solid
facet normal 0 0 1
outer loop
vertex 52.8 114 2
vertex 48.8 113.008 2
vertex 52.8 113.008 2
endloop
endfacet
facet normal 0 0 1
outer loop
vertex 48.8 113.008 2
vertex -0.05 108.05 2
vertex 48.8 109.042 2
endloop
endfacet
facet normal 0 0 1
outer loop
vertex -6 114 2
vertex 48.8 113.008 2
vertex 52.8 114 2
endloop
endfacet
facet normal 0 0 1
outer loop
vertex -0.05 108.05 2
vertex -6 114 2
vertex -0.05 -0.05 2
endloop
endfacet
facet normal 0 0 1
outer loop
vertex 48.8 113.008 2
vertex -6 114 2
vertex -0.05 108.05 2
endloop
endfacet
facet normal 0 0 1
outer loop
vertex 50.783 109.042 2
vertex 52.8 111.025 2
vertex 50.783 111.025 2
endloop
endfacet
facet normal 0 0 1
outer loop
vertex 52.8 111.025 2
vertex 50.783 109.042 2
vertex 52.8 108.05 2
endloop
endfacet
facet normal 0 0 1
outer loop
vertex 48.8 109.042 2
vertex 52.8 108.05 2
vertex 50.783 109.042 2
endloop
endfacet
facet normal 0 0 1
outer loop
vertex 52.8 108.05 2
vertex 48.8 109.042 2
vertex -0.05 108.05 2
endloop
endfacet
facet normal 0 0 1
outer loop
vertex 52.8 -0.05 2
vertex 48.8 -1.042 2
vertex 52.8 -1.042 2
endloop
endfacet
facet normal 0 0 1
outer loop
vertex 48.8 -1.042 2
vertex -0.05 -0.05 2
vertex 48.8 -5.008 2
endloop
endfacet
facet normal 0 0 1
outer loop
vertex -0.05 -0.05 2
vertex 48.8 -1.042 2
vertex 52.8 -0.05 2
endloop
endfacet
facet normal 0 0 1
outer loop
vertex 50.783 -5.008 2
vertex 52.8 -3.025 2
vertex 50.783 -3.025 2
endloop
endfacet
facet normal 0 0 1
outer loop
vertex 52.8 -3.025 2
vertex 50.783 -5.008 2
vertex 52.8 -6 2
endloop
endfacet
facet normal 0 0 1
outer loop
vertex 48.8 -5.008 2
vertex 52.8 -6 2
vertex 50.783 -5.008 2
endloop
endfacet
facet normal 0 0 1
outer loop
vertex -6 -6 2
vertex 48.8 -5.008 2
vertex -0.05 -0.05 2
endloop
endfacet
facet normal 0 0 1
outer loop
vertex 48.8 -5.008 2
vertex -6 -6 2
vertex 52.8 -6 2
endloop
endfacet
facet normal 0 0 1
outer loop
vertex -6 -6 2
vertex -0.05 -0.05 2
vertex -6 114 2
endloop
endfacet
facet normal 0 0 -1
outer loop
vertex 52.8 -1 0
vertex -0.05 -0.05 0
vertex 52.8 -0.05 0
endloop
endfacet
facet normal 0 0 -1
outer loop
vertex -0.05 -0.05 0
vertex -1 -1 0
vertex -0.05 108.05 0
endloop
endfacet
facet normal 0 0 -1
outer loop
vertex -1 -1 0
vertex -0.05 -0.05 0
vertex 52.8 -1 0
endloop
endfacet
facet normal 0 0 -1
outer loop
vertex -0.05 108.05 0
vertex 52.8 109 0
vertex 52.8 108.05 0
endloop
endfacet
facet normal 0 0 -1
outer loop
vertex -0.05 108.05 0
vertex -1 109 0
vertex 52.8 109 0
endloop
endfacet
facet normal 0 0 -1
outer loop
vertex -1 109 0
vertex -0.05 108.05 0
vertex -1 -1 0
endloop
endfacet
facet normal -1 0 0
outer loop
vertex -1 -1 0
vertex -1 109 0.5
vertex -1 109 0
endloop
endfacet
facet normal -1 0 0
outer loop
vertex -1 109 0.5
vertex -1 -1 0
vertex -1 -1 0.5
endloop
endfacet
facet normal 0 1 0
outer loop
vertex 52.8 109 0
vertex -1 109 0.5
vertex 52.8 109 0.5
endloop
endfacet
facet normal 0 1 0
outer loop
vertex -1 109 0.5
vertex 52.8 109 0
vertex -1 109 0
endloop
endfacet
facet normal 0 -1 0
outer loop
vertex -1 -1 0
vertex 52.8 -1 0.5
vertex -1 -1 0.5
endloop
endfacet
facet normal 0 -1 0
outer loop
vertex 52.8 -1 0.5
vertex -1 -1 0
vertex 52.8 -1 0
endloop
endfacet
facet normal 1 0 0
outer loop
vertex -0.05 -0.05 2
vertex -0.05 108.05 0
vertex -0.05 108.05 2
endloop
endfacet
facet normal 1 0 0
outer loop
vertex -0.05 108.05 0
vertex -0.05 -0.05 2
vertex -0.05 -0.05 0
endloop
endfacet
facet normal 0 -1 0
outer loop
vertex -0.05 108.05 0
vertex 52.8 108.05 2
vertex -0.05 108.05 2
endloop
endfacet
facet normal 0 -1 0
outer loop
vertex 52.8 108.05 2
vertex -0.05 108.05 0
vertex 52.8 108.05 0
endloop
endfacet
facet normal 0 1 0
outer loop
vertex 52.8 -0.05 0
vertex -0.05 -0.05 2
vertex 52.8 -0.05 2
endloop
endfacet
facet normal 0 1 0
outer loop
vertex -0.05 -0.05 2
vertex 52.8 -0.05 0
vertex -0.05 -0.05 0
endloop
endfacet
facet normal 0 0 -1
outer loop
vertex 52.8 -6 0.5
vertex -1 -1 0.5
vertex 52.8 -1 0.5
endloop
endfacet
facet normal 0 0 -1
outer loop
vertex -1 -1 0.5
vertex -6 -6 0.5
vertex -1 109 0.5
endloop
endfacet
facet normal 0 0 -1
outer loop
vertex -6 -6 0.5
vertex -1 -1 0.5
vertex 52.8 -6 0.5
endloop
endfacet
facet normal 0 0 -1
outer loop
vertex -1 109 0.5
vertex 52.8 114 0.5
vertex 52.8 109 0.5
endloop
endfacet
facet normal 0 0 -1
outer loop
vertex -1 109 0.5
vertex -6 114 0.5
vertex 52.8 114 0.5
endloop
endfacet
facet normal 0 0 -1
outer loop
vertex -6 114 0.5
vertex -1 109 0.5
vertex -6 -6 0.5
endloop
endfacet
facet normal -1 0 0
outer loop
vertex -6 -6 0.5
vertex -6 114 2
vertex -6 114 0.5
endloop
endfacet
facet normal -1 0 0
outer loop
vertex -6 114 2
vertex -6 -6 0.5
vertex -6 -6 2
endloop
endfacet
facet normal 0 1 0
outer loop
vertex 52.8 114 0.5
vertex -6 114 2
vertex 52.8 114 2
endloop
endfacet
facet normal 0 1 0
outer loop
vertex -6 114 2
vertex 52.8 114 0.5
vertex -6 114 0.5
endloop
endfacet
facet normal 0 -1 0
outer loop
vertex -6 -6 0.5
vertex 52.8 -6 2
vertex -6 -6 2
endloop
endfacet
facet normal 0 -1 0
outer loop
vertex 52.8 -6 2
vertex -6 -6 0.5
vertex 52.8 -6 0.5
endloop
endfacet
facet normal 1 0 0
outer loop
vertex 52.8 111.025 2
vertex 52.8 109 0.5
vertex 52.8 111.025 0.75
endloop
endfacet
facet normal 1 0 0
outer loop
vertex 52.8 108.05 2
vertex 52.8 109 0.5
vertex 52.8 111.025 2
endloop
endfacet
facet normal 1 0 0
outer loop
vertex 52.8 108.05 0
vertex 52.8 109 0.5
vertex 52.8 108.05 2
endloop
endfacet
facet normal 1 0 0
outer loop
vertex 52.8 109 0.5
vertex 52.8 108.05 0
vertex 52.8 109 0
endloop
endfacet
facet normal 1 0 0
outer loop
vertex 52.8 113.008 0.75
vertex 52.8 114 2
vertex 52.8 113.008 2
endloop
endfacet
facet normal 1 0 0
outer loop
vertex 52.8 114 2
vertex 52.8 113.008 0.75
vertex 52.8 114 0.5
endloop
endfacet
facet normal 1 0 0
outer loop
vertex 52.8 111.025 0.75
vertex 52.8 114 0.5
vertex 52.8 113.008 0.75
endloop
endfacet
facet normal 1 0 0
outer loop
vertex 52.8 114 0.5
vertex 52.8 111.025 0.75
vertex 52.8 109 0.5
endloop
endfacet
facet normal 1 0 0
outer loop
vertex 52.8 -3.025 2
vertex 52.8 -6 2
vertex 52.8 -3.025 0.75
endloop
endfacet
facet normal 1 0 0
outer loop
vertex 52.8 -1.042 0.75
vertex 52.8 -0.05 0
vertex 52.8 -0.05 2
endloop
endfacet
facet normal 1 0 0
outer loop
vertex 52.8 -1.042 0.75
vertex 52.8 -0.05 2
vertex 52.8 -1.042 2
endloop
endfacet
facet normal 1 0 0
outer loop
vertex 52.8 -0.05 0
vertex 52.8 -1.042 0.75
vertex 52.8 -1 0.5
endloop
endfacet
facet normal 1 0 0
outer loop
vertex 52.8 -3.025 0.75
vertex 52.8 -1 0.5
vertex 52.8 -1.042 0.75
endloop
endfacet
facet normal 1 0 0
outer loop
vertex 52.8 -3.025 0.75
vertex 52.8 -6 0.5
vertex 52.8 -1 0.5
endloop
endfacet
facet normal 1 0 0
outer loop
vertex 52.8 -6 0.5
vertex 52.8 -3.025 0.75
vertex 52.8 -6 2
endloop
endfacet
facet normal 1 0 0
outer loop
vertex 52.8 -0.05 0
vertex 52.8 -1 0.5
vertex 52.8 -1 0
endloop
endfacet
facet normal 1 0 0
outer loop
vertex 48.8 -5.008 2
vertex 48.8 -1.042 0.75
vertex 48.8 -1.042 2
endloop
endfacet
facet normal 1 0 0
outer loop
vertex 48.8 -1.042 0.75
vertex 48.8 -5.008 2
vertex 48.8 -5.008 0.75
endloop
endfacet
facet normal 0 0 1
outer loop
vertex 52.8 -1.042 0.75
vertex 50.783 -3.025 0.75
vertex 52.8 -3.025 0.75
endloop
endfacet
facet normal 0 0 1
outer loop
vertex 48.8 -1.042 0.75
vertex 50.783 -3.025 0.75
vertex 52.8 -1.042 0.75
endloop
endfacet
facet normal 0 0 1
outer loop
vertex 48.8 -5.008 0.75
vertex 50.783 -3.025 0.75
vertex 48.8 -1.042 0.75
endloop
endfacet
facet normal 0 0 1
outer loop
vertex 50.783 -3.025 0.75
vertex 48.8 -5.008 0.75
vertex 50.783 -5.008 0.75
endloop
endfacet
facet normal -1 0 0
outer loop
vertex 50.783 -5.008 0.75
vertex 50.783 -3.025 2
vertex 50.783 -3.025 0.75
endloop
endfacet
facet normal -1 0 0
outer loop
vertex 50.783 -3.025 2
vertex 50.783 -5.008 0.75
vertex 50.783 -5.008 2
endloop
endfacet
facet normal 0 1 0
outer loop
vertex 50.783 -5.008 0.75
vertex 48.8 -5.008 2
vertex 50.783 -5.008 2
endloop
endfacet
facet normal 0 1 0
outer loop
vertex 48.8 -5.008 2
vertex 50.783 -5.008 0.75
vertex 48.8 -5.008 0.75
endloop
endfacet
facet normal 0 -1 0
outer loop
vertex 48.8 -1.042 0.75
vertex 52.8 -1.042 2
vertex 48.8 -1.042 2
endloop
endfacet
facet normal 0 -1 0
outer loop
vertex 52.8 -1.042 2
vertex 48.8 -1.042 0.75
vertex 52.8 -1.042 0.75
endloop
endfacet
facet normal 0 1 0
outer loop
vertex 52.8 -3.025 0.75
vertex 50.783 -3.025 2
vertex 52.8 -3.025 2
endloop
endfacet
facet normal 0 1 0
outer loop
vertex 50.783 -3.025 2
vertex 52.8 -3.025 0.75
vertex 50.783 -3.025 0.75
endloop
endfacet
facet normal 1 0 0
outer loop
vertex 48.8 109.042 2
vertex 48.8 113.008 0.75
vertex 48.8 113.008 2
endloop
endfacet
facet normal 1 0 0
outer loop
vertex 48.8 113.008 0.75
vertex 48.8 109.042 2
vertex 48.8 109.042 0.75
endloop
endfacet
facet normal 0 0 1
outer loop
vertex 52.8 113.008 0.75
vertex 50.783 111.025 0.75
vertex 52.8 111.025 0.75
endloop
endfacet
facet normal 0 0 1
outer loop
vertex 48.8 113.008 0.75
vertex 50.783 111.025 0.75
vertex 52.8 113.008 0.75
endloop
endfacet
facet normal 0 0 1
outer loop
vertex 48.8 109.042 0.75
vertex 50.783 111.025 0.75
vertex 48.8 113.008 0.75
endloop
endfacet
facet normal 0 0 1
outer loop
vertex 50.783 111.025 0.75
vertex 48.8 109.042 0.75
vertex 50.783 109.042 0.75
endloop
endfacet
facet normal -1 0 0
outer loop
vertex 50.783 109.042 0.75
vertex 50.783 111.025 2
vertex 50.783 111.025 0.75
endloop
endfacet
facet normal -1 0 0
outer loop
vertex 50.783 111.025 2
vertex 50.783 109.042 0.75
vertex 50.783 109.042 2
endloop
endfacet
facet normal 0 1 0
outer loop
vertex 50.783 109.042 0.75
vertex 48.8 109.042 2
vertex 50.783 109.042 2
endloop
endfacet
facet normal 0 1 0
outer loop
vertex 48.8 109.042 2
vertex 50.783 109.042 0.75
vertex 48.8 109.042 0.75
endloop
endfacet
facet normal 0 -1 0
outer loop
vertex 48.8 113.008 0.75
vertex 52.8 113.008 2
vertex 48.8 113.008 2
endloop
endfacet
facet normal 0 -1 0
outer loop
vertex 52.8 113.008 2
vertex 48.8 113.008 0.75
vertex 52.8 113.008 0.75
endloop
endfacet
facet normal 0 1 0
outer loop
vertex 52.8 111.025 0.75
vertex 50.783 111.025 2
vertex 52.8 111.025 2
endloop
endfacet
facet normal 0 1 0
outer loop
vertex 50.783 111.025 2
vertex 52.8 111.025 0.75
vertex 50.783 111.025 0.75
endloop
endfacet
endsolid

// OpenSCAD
// Generated by SolidPython 1.0.4 on 2020-12-12 15:58:17


difference() {
	difference() {
		difference() {
			union() {
				difference() {
					translate(v = [-1.0000000000, -1.0000000000, 0]) {
						cube(size = [74.0000000000, 110.0000000000, 2]);
					}
					translate(v = [-0.0500000000, -0.0500000000, 0]) {
						cube(size = [72.1000000000, 108.1000000000, 2]);
					}
				}
				translate(v = [0, 0, 0.5000000000]) {
					difference() {
						translate(v = [-6.0000000000, -6.0000000000, 0]) {
							cube(size = [84.0000000000, 120.0000000000, 1.5000000000]);
						}
						translate(v = [-1.0000000000, -1.0000000000, 0]) {
							cube(size = [74.0000000000, 110.0000000000, 1.5000000000]);
						}
					}
				}
			}
			translate(v = [52.8000000000, -6.0000000000, 0]) {
				cube(size = [25.2000000000, 120.0000000000, 2]);
			}
		}
		translate(v = [48.8000000000, -5.0083333333, 0]) {
			translate(v = [0, 0, 0.7500000000]) {
				translate(v = [4, 3.9666666667, 0]) {
					rotate(a = -180) {
						union() {
							translate(v = [2.0166666667, 0, 0]) {
								cube(size = [1.9833333333, 3.9666666667, 1.2500000000]);
							}
							cube(size = [4, 1.9833333333, 1.2500000000]);
						}
					}
				}
			}
		}
	}
	translate(v = [48.8000000000, 109.0416666667, 0]) {
		translate(v = [0, 0, 0.7500000000]) {
			translate(v = [4, 3.9666666667, 0]) {
				rotate(a = -180) {
					union() {
						translate(v = [2.0166666667, 0, 0]) {
							cube(size = [1.9833333333, 3.9666666667, 1.2500000000]);
						}
						cube(size = [4, 1.9833333333, 1.2500000000]);
					}
				}
			}
		}
	}
}
